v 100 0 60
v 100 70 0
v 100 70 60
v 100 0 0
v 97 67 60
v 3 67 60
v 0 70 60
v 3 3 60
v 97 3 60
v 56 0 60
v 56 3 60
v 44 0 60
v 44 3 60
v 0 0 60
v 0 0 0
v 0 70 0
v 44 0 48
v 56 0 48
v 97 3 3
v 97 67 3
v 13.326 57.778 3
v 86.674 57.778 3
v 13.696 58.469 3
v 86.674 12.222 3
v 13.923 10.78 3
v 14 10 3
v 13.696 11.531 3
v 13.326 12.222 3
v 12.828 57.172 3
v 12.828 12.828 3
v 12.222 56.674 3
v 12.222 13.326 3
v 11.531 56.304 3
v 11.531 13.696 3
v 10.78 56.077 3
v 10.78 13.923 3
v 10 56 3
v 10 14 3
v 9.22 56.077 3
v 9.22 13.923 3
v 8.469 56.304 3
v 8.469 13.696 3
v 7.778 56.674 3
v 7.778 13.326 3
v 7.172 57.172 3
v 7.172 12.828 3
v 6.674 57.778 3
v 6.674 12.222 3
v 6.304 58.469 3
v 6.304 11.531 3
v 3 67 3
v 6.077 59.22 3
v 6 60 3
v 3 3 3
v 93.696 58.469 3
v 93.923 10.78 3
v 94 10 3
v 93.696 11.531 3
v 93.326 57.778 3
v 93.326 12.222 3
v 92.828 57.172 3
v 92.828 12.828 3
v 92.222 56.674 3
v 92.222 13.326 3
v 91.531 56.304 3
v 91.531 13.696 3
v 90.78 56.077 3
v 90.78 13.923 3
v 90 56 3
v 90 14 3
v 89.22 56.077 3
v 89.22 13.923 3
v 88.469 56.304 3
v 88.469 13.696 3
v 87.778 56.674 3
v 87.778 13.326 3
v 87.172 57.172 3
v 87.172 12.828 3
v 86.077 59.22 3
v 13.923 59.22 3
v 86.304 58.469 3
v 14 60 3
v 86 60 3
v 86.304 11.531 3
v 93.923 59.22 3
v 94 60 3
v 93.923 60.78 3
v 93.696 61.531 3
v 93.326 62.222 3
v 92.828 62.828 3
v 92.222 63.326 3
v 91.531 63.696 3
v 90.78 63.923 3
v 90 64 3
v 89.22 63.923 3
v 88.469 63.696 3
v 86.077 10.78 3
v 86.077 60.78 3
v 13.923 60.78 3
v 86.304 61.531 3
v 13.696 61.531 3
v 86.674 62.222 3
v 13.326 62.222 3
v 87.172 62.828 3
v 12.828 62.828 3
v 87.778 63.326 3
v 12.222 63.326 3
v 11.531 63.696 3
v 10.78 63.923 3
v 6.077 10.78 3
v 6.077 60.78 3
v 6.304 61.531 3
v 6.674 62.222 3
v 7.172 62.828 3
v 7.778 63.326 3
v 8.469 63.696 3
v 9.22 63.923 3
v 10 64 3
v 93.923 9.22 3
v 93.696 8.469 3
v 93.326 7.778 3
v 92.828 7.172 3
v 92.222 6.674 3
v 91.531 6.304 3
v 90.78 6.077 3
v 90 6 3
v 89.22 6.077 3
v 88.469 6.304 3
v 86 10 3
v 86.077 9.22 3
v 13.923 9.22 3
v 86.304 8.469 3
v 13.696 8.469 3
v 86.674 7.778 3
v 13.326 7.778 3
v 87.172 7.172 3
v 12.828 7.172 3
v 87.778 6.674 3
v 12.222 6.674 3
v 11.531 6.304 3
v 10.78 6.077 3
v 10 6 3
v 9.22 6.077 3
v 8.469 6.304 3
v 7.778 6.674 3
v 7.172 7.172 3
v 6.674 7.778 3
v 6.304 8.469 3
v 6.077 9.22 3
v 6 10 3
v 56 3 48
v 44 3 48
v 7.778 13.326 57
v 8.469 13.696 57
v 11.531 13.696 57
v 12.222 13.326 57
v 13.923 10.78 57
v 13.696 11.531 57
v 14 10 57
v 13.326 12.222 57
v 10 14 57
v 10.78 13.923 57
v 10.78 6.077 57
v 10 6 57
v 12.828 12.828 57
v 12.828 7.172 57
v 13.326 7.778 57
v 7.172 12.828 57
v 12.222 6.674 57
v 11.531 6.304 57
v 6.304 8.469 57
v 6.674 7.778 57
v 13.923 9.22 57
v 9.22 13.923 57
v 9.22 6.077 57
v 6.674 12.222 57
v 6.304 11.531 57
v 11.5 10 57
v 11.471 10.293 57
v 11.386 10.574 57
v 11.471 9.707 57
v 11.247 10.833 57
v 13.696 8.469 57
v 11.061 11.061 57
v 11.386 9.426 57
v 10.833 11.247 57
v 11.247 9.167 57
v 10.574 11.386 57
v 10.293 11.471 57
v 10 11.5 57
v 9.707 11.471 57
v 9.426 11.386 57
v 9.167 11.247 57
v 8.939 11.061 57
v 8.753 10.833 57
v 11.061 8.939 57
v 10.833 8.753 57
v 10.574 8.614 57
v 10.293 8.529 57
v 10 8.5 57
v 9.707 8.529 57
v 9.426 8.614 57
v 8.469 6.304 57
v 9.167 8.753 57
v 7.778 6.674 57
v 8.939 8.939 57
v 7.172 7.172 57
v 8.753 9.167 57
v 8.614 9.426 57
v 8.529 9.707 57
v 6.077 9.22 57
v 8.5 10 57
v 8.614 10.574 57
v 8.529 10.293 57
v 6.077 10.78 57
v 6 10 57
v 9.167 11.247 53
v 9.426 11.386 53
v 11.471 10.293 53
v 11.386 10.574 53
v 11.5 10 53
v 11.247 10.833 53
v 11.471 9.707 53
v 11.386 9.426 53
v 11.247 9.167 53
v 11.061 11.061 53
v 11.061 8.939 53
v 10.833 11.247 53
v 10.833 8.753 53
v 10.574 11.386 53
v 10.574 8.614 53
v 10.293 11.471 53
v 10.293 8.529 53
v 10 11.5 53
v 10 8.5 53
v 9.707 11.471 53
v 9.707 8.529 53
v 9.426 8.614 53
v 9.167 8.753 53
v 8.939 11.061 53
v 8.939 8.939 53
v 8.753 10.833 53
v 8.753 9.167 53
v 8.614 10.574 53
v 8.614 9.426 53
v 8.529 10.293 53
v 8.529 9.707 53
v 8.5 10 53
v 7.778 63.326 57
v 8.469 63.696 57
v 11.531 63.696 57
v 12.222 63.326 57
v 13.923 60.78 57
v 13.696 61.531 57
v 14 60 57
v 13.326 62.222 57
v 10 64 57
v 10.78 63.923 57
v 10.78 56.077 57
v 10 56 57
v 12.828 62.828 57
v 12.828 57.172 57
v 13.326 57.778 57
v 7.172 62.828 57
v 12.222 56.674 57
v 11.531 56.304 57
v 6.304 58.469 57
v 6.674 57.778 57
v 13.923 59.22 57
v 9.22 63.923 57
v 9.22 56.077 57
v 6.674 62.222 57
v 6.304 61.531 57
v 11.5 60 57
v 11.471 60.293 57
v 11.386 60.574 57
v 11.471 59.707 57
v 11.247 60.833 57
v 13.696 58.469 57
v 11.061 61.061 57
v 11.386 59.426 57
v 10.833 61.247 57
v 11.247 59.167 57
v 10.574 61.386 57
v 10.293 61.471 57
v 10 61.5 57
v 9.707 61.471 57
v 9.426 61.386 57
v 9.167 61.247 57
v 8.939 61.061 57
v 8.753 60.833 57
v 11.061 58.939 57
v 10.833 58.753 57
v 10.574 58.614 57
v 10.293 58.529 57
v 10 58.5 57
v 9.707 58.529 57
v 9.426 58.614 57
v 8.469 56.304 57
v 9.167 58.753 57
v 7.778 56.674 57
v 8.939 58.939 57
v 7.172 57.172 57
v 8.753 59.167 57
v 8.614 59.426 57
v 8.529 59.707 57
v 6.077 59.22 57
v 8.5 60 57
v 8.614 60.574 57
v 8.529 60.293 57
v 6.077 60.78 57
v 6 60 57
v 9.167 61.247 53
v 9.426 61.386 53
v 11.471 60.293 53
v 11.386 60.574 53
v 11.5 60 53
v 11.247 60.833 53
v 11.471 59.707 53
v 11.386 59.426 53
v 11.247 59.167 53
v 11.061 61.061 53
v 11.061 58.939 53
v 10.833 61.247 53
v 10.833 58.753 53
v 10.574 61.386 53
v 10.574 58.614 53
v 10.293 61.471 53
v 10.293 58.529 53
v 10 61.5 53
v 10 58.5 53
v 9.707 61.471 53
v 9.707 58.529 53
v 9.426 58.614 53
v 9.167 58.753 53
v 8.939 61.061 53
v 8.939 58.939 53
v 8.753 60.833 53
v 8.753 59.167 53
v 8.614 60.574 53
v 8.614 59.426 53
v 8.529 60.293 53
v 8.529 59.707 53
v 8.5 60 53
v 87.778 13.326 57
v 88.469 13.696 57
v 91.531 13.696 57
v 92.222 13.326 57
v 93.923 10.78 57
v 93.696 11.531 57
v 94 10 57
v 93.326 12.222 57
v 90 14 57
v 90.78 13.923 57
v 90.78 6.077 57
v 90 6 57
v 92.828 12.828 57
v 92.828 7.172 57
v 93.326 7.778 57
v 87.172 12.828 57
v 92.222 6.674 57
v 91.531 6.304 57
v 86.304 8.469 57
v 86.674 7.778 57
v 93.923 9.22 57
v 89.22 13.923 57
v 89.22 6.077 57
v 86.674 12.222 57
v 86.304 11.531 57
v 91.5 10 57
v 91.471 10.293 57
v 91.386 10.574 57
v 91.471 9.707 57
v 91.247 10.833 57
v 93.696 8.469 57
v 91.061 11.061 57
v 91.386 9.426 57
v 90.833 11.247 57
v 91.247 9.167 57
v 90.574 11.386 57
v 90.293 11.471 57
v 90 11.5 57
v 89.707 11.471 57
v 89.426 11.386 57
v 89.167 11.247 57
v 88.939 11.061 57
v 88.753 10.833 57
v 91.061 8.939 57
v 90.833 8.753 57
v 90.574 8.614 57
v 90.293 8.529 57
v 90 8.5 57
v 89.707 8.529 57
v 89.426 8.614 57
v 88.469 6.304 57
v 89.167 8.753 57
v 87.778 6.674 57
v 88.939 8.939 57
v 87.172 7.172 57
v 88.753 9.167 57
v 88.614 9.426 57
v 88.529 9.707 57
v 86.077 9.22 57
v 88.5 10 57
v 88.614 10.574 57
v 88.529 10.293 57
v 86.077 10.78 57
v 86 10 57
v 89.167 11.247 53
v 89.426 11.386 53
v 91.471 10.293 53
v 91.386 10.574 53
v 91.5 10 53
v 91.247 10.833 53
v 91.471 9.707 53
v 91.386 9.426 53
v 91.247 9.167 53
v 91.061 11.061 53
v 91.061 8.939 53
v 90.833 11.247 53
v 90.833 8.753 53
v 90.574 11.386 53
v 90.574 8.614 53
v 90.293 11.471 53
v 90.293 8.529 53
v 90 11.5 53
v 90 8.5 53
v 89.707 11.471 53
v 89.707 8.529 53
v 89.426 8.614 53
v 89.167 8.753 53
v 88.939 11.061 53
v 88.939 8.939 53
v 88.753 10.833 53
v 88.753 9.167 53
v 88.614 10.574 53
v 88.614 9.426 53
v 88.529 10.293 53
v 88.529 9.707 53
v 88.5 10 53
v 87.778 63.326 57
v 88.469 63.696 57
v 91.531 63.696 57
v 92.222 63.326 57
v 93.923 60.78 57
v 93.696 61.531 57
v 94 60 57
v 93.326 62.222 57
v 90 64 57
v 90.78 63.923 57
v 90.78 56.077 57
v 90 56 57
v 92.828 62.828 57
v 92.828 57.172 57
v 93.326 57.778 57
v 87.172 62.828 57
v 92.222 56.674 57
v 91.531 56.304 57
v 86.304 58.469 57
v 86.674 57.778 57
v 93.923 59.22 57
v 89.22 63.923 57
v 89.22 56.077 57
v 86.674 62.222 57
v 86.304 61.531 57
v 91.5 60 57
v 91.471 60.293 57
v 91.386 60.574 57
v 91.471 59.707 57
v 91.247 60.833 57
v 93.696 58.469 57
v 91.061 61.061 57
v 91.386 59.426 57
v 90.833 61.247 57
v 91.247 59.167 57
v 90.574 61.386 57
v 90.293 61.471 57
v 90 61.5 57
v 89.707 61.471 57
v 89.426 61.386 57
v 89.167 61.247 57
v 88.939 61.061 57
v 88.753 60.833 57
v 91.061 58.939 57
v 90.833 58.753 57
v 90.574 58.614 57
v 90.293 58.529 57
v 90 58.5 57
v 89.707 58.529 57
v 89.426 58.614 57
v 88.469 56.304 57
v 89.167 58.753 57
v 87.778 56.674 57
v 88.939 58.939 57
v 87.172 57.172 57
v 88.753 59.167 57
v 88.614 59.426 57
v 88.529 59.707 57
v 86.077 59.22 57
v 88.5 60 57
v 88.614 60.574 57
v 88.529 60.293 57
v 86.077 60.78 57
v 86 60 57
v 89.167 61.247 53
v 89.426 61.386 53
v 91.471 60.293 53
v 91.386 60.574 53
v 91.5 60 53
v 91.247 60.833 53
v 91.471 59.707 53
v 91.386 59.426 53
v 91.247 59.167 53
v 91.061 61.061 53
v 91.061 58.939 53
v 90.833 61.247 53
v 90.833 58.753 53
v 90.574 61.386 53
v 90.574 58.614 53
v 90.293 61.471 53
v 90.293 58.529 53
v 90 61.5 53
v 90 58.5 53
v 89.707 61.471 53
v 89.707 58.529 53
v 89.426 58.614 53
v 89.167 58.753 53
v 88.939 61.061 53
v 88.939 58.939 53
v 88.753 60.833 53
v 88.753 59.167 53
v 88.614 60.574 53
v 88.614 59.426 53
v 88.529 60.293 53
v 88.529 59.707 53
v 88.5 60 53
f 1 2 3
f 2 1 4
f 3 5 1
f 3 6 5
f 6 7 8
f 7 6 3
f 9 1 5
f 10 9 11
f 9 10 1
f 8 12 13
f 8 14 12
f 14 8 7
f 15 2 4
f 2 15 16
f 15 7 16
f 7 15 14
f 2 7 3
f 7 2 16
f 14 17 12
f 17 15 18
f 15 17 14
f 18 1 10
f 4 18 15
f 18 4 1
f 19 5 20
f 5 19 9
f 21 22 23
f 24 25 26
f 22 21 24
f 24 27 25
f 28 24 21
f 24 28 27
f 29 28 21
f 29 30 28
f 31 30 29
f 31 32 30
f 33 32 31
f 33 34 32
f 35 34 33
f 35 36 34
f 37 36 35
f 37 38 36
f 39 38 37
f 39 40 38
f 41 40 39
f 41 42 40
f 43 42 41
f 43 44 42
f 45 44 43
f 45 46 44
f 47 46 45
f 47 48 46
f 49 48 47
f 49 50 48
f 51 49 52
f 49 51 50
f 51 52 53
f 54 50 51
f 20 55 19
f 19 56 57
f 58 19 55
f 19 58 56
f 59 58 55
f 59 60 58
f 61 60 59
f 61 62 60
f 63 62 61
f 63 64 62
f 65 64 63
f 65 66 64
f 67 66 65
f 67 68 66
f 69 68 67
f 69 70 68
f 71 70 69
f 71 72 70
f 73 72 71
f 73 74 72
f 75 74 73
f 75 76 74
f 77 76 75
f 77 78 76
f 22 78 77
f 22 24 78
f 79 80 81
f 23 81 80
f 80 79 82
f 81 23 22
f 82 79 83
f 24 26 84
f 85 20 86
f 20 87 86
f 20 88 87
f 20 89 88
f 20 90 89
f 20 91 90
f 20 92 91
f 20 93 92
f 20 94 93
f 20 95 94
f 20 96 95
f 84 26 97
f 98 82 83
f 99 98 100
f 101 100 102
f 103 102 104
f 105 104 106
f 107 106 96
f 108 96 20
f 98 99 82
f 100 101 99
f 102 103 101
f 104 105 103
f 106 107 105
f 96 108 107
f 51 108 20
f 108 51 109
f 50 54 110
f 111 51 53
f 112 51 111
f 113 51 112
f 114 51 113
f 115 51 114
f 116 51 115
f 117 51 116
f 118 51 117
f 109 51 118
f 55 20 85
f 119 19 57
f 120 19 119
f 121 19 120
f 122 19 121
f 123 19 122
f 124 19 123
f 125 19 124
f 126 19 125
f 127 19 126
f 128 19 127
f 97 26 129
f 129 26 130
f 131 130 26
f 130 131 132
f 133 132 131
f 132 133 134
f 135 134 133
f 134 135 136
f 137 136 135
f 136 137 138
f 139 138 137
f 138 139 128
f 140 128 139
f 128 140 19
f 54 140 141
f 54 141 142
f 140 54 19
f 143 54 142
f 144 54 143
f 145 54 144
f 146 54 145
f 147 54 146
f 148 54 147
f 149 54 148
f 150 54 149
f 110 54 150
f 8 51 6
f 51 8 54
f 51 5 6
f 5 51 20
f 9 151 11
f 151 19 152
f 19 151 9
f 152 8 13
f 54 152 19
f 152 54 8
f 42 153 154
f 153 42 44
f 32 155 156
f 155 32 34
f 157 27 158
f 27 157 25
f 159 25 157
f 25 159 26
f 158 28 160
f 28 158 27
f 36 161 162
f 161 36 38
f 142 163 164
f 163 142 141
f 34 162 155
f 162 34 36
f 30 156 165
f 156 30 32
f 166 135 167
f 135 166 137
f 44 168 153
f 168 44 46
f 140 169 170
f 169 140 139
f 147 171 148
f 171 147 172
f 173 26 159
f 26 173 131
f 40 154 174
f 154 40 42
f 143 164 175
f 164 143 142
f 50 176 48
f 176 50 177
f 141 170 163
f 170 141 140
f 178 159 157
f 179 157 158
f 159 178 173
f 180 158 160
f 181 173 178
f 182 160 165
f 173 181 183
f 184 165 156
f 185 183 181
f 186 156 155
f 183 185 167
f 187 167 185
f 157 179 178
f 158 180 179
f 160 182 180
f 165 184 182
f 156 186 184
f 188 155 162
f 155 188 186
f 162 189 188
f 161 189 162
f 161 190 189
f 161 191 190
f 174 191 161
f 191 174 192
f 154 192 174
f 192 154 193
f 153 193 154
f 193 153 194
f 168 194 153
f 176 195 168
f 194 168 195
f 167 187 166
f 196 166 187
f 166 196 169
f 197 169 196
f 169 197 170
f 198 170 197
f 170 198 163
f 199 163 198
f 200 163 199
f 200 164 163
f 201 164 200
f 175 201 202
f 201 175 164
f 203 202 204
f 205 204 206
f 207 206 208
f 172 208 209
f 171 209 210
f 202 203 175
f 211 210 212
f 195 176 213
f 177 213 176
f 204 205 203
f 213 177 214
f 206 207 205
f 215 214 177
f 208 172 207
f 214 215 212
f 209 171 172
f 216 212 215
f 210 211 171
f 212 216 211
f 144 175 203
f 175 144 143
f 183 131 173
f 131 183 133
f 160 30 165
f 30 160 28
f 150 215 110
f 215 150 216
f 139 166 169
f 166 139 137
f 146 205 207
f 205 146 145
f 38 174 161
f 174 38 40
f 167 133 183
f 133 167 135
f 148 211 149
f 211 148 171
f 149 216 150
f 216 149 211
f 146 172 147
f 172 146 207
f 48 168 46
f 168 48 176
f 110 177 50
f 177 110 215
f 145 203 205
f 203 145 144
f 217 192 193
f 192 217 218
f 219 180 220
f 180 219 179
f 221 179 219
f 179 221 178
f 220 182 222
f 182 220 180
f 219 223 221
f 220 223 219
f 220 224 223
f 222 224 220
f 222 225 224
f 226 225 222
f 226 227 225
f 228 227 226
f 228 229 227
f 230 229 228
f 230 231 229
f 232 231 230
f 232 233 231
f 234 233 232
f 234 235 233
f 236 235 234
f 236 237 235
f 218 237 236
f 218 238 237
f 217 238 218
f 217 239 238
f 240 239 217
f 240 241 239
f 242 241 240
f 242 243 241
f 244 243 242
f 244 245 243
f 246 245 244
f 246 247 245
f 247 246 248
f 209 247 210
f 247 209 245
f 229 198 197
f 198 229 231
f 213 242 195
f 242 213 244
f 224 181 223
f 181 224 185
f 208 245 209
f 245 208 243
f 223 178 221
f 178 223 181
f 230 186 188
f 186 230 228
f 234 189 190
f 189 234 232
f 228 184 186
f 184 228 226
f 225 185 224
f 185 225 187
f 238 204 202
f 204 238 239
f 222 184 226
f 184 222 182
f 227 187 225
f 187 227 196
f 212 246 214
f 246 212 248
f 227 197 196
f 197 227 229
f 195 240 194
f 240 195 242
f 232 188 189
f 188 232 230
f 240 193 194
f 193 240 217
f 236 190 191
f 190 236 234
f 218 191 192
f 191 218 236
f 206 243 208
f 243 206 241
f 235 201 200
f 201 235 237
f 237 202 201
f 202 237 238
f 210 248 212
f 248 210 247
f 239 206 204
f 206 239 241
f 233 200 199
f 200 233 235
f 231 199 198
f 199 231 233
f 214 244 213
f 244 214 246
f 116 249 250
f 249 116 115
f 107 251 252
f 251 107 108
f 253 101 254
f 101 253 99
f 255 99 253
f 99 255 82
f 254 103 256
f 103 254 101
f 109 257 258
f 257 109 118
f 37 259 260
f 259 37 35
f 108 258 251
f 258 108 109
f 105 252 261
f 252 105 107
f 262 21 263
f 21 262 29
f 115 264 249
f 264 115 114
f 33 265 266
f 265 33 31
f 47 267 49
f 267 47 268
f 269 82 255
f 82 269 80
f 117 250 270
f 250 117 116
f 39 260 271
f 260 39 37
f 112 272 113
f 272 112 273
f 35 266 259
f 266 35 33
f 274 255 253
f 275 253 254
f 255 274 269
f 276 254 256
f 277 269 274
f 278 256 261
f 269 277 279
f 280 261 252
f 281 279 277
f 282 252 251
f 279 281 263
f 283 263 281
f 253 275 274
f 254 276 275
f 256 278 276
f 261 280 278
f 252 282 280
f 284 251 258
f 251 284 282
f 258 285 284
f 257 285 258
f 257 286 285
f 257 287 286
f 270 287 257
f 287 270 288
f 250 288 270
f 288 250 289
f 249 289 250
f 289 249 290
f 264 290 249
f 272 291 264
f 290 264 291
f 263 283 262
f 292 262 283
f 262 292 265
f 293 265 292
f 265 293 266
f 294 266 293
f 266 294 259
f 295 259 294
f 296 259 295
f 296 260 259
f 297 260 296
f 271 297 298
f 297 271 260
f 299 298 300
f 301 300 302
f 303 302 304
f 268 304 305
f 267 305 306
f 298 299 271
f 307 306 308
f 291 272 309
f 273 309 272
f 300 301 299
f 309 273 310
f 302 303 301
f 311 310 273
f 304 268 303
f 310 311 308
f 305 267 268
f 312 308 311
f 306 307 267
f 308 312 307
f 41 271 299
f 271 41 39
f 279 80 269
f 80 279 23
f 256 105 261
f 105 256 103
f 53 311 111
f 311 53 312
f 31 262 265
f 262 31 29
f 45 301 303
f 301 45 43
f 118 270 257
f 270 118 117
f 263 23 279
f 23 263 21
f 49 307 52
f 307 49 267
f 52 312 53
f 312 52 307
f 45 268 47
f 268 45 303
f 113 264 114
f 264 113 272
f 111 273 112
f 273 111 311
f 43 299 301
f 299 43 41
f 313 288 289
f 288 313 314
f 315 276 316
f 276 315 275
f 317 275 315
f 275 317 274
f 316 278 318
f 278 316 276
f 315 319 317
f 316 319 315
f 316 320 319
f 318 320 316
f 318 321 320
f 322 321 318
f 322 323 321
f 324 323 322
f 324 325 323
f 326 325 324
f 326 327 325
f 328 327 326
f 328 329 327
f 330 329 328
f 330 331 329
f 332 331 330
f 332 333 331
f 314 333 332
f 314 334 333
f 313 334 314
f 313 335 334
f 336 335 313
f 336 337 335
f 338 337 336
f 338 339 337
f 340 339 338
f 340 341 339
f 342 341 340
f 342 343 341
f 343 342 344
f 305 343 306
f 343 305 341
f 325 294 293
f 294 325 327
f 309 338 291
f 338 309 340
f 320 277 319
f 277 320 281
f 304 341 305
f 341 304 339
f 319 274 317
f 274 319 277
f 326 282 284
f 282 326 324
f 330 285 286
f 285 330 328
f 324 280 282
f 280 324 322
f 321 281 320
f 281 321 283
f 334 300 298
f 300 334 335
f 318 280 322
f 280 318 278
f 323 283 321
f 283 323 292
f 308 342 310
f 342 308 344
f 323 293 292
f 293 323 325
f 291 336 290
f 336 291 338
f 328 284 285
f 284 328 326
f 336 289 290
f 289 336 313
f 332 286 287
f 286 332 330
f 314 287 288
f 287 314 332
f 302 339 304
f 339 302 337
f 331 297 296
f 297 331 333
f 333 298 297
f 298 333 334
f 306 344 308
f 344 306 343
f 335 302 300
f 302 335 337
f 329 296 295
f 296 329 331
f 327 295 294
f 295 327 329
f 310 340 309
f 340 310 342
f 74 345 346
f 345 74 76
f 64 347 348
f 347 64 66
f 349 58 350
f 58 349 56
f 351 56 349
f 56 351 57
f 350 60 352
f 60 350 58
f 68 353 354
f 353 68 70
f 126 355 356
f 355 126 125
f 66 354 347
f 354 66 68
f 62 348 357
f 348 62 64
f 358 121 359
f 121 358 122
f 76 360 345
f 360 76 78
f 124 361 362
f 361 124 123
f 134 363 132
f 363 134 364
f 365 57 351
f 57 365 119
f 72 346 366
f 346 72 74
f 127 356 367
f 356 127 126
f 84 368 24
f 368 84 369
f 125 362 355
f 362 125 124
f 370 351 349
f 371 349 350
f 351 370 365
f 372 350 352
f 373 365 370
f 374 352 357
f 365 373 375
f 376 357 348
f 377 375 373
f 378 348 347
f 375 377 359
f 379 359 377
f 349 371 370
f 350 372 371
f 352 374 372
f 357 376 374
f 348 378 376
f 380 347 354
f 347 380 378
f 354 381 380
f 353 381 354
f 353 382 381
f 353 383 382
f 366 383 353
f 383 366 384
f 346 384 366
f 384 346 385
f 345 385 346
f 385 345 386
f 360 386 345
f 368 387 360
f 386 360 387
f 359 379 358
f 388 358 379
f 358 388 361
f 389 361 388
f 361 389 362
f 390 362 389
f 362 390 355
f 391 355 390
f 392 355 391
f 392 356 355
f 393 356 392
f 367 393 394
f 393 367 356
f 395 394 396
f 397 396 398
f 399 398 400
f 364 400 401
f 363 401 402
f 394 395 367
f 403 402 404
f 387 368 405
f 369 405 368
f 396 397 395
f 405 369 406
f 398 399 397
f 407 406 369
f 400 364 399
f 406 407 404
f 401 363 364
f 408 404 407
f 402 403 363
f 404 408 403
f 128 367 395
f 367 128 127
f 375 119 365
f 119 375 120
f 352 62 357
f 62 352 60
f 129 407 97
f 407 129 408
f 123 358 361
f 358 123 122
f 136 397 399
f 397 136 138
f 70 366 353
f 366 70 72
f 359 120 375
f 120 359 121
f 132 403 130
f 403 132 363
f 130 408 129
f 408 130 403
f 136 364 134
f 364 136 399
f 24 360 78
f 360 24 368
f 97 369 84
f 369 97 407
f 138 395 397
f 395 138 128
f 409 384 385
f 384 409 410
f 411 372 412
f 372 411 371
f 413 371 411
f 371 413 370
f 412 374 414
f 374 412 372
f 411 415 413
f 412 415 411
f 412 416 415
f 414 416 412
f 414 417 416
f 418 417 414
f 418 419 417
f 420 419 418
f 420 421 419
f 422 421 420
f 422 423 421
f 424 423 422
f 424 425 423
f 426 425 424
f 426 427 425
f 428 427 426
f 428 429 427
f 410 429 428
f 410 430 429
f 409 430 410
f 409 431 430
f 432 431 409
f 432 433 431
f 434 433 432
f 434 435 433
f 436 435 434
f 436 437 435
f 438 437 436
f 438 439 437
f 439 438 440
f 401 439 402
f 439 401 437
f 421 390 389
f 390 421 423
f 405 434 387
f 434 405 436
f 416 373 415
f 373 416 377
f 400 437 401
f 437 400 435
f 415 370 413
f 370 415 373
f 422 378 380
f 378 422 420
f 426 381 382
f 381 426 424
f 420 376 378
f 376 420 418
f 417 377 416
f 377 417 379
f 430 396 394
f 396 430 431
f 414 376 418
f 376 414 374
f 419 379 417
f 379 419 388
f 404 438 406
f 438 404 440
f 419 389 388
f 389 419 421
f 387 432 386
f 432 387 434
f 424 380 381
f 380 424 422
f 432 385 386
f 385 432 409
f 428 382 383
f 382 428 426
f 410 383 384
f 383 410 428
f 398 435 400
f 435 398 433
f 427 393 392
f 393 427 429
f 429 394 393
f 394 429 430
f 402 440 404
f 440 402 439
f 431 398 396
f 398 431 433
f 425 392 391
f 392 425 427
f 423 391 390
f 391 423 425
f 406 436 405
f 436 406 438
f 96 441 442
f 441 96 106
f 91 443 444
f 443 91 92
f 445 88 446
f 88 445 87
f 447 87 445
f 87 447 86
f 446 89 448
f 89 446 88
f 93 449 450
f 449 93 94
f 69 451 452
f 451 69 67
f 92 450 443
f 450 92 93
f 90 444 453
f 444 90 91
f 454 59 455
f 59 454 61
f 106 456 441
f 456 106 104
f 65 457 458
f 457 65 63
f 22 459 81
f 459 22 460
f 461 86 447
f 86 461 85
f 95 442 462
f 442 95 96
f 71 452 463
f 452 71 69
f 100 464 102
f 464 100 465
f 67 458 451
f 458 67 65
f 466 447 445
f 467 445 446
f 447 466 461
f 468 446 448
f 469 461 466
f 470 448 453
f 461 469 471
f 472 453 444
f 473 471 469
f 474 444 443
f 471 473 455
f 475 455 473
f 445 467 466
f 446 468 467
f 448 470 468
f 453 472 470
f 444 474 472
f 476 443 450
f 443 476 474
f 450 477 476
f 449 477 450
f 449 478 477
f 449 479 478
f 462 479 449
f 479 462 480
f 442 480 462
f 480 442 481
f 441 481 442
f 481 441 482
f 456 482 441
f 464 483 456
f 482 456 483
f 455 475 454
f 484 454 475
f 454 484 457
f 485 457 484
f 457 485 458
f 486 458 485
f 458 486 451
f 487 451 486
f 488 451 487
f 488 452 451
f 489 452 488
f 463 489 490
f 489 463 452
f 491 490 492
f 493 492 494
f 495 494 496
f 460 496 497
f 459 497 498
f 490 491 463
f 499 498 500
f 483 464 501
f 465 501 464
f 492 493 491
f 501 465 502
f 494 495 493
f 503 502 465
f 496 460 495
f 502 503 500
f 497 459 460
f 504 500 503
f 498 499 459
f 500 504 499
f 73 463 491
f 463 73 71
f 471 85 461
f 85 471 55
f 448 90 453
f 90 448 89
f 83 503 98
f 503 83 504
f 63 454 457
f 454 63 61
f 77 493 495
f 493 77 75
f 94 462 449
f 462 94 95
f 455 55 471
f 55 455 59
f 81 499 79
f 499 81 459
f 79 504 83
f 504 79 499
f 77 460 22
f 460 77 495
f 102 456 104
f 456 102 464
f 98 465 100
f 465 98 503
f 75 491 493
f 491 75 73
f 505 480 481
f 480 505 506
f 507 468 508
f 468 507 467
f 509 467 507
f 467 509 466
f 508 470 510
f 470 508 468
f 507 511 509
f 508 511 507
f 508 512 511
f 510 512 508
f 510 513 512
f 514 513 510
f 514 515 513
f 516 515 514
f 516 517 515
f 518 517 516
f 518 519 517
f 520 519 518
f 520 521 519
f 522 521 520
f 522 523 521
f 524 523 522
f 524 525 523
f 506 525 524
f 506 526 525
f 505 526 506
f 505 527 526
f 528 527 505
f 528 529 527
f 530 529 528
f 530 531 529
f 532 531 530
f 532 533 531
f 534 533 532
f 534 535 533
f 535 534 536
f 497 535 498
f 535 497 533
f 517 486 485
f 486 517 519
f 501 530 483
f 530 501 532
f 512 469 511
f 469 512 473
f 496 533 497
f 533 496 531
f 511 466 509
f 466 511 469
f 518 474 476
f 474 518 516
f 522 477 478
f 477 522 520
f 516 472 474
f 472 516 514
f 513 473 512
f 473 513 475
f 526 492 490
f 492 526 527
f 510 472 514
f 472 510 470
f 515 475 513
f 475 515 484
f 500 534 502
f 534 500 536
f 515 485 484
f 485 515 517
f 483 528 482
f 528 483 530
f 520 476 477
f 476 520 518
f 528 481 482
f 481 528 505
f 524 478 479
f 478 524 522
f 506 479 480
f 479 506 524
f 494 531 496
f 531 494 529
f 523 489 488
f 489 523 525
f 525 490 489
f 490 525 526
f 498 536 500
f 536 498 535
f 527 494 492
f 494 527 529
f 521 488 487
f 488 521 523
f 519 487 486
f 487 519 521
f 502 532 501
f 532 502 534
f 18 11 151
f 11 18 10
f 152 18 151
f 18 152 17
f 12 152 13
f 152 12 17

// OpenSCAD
$fn = 32;

// ----------------------------------------------------------------------
// Enclosure box: both enclosure
// ----------------------------------------------------------------------

// --- parameters (mm) ---
box_l = 100;              // outer length, X
box_w = 70;               // outer width, Y
box_h = 60;               // outer height
wall_t = 3;               // wall thickness
boss_r = 4;               // corner boss radius
hole_r = 1.5;             // boss screw hole radius
boss_in = 10;             // boss inset from the corners
notch_w = 12;             // cable notch width
notch_h = 12;             // cable notch height

inner_h = box_h - wall_t;  // cavity depth
boss_h = inner_h - 2;  // corner boss height

difference() {
  union() {
    difference() {
      cube([box_l, box_w, box_h]);
      translate([wall_t, wall_t, wall_t])
        cube([box_l - 2 * wall_t, box_w - 2 * wall_t, box_h]);
    }
    for (sx = [0, 1], sy = [0, 1])
      translate([sx ? box_l - boss_in : boss_in,
                 sy ? box_w - boss_in : boss_in, wall_t - 1])
        difference() {
          cylinder(r = boss_r, h = boss_h);
          translate([0, 0, boss_h - 4])
            cylinder(r = hole_r, h = 5);
        }
  }
  translate([box_l / 2 - notch_w / 2, -1, box_h - notch_h])
    cube([notch_w, wall_t + 2, notch_h + 1]);
}
